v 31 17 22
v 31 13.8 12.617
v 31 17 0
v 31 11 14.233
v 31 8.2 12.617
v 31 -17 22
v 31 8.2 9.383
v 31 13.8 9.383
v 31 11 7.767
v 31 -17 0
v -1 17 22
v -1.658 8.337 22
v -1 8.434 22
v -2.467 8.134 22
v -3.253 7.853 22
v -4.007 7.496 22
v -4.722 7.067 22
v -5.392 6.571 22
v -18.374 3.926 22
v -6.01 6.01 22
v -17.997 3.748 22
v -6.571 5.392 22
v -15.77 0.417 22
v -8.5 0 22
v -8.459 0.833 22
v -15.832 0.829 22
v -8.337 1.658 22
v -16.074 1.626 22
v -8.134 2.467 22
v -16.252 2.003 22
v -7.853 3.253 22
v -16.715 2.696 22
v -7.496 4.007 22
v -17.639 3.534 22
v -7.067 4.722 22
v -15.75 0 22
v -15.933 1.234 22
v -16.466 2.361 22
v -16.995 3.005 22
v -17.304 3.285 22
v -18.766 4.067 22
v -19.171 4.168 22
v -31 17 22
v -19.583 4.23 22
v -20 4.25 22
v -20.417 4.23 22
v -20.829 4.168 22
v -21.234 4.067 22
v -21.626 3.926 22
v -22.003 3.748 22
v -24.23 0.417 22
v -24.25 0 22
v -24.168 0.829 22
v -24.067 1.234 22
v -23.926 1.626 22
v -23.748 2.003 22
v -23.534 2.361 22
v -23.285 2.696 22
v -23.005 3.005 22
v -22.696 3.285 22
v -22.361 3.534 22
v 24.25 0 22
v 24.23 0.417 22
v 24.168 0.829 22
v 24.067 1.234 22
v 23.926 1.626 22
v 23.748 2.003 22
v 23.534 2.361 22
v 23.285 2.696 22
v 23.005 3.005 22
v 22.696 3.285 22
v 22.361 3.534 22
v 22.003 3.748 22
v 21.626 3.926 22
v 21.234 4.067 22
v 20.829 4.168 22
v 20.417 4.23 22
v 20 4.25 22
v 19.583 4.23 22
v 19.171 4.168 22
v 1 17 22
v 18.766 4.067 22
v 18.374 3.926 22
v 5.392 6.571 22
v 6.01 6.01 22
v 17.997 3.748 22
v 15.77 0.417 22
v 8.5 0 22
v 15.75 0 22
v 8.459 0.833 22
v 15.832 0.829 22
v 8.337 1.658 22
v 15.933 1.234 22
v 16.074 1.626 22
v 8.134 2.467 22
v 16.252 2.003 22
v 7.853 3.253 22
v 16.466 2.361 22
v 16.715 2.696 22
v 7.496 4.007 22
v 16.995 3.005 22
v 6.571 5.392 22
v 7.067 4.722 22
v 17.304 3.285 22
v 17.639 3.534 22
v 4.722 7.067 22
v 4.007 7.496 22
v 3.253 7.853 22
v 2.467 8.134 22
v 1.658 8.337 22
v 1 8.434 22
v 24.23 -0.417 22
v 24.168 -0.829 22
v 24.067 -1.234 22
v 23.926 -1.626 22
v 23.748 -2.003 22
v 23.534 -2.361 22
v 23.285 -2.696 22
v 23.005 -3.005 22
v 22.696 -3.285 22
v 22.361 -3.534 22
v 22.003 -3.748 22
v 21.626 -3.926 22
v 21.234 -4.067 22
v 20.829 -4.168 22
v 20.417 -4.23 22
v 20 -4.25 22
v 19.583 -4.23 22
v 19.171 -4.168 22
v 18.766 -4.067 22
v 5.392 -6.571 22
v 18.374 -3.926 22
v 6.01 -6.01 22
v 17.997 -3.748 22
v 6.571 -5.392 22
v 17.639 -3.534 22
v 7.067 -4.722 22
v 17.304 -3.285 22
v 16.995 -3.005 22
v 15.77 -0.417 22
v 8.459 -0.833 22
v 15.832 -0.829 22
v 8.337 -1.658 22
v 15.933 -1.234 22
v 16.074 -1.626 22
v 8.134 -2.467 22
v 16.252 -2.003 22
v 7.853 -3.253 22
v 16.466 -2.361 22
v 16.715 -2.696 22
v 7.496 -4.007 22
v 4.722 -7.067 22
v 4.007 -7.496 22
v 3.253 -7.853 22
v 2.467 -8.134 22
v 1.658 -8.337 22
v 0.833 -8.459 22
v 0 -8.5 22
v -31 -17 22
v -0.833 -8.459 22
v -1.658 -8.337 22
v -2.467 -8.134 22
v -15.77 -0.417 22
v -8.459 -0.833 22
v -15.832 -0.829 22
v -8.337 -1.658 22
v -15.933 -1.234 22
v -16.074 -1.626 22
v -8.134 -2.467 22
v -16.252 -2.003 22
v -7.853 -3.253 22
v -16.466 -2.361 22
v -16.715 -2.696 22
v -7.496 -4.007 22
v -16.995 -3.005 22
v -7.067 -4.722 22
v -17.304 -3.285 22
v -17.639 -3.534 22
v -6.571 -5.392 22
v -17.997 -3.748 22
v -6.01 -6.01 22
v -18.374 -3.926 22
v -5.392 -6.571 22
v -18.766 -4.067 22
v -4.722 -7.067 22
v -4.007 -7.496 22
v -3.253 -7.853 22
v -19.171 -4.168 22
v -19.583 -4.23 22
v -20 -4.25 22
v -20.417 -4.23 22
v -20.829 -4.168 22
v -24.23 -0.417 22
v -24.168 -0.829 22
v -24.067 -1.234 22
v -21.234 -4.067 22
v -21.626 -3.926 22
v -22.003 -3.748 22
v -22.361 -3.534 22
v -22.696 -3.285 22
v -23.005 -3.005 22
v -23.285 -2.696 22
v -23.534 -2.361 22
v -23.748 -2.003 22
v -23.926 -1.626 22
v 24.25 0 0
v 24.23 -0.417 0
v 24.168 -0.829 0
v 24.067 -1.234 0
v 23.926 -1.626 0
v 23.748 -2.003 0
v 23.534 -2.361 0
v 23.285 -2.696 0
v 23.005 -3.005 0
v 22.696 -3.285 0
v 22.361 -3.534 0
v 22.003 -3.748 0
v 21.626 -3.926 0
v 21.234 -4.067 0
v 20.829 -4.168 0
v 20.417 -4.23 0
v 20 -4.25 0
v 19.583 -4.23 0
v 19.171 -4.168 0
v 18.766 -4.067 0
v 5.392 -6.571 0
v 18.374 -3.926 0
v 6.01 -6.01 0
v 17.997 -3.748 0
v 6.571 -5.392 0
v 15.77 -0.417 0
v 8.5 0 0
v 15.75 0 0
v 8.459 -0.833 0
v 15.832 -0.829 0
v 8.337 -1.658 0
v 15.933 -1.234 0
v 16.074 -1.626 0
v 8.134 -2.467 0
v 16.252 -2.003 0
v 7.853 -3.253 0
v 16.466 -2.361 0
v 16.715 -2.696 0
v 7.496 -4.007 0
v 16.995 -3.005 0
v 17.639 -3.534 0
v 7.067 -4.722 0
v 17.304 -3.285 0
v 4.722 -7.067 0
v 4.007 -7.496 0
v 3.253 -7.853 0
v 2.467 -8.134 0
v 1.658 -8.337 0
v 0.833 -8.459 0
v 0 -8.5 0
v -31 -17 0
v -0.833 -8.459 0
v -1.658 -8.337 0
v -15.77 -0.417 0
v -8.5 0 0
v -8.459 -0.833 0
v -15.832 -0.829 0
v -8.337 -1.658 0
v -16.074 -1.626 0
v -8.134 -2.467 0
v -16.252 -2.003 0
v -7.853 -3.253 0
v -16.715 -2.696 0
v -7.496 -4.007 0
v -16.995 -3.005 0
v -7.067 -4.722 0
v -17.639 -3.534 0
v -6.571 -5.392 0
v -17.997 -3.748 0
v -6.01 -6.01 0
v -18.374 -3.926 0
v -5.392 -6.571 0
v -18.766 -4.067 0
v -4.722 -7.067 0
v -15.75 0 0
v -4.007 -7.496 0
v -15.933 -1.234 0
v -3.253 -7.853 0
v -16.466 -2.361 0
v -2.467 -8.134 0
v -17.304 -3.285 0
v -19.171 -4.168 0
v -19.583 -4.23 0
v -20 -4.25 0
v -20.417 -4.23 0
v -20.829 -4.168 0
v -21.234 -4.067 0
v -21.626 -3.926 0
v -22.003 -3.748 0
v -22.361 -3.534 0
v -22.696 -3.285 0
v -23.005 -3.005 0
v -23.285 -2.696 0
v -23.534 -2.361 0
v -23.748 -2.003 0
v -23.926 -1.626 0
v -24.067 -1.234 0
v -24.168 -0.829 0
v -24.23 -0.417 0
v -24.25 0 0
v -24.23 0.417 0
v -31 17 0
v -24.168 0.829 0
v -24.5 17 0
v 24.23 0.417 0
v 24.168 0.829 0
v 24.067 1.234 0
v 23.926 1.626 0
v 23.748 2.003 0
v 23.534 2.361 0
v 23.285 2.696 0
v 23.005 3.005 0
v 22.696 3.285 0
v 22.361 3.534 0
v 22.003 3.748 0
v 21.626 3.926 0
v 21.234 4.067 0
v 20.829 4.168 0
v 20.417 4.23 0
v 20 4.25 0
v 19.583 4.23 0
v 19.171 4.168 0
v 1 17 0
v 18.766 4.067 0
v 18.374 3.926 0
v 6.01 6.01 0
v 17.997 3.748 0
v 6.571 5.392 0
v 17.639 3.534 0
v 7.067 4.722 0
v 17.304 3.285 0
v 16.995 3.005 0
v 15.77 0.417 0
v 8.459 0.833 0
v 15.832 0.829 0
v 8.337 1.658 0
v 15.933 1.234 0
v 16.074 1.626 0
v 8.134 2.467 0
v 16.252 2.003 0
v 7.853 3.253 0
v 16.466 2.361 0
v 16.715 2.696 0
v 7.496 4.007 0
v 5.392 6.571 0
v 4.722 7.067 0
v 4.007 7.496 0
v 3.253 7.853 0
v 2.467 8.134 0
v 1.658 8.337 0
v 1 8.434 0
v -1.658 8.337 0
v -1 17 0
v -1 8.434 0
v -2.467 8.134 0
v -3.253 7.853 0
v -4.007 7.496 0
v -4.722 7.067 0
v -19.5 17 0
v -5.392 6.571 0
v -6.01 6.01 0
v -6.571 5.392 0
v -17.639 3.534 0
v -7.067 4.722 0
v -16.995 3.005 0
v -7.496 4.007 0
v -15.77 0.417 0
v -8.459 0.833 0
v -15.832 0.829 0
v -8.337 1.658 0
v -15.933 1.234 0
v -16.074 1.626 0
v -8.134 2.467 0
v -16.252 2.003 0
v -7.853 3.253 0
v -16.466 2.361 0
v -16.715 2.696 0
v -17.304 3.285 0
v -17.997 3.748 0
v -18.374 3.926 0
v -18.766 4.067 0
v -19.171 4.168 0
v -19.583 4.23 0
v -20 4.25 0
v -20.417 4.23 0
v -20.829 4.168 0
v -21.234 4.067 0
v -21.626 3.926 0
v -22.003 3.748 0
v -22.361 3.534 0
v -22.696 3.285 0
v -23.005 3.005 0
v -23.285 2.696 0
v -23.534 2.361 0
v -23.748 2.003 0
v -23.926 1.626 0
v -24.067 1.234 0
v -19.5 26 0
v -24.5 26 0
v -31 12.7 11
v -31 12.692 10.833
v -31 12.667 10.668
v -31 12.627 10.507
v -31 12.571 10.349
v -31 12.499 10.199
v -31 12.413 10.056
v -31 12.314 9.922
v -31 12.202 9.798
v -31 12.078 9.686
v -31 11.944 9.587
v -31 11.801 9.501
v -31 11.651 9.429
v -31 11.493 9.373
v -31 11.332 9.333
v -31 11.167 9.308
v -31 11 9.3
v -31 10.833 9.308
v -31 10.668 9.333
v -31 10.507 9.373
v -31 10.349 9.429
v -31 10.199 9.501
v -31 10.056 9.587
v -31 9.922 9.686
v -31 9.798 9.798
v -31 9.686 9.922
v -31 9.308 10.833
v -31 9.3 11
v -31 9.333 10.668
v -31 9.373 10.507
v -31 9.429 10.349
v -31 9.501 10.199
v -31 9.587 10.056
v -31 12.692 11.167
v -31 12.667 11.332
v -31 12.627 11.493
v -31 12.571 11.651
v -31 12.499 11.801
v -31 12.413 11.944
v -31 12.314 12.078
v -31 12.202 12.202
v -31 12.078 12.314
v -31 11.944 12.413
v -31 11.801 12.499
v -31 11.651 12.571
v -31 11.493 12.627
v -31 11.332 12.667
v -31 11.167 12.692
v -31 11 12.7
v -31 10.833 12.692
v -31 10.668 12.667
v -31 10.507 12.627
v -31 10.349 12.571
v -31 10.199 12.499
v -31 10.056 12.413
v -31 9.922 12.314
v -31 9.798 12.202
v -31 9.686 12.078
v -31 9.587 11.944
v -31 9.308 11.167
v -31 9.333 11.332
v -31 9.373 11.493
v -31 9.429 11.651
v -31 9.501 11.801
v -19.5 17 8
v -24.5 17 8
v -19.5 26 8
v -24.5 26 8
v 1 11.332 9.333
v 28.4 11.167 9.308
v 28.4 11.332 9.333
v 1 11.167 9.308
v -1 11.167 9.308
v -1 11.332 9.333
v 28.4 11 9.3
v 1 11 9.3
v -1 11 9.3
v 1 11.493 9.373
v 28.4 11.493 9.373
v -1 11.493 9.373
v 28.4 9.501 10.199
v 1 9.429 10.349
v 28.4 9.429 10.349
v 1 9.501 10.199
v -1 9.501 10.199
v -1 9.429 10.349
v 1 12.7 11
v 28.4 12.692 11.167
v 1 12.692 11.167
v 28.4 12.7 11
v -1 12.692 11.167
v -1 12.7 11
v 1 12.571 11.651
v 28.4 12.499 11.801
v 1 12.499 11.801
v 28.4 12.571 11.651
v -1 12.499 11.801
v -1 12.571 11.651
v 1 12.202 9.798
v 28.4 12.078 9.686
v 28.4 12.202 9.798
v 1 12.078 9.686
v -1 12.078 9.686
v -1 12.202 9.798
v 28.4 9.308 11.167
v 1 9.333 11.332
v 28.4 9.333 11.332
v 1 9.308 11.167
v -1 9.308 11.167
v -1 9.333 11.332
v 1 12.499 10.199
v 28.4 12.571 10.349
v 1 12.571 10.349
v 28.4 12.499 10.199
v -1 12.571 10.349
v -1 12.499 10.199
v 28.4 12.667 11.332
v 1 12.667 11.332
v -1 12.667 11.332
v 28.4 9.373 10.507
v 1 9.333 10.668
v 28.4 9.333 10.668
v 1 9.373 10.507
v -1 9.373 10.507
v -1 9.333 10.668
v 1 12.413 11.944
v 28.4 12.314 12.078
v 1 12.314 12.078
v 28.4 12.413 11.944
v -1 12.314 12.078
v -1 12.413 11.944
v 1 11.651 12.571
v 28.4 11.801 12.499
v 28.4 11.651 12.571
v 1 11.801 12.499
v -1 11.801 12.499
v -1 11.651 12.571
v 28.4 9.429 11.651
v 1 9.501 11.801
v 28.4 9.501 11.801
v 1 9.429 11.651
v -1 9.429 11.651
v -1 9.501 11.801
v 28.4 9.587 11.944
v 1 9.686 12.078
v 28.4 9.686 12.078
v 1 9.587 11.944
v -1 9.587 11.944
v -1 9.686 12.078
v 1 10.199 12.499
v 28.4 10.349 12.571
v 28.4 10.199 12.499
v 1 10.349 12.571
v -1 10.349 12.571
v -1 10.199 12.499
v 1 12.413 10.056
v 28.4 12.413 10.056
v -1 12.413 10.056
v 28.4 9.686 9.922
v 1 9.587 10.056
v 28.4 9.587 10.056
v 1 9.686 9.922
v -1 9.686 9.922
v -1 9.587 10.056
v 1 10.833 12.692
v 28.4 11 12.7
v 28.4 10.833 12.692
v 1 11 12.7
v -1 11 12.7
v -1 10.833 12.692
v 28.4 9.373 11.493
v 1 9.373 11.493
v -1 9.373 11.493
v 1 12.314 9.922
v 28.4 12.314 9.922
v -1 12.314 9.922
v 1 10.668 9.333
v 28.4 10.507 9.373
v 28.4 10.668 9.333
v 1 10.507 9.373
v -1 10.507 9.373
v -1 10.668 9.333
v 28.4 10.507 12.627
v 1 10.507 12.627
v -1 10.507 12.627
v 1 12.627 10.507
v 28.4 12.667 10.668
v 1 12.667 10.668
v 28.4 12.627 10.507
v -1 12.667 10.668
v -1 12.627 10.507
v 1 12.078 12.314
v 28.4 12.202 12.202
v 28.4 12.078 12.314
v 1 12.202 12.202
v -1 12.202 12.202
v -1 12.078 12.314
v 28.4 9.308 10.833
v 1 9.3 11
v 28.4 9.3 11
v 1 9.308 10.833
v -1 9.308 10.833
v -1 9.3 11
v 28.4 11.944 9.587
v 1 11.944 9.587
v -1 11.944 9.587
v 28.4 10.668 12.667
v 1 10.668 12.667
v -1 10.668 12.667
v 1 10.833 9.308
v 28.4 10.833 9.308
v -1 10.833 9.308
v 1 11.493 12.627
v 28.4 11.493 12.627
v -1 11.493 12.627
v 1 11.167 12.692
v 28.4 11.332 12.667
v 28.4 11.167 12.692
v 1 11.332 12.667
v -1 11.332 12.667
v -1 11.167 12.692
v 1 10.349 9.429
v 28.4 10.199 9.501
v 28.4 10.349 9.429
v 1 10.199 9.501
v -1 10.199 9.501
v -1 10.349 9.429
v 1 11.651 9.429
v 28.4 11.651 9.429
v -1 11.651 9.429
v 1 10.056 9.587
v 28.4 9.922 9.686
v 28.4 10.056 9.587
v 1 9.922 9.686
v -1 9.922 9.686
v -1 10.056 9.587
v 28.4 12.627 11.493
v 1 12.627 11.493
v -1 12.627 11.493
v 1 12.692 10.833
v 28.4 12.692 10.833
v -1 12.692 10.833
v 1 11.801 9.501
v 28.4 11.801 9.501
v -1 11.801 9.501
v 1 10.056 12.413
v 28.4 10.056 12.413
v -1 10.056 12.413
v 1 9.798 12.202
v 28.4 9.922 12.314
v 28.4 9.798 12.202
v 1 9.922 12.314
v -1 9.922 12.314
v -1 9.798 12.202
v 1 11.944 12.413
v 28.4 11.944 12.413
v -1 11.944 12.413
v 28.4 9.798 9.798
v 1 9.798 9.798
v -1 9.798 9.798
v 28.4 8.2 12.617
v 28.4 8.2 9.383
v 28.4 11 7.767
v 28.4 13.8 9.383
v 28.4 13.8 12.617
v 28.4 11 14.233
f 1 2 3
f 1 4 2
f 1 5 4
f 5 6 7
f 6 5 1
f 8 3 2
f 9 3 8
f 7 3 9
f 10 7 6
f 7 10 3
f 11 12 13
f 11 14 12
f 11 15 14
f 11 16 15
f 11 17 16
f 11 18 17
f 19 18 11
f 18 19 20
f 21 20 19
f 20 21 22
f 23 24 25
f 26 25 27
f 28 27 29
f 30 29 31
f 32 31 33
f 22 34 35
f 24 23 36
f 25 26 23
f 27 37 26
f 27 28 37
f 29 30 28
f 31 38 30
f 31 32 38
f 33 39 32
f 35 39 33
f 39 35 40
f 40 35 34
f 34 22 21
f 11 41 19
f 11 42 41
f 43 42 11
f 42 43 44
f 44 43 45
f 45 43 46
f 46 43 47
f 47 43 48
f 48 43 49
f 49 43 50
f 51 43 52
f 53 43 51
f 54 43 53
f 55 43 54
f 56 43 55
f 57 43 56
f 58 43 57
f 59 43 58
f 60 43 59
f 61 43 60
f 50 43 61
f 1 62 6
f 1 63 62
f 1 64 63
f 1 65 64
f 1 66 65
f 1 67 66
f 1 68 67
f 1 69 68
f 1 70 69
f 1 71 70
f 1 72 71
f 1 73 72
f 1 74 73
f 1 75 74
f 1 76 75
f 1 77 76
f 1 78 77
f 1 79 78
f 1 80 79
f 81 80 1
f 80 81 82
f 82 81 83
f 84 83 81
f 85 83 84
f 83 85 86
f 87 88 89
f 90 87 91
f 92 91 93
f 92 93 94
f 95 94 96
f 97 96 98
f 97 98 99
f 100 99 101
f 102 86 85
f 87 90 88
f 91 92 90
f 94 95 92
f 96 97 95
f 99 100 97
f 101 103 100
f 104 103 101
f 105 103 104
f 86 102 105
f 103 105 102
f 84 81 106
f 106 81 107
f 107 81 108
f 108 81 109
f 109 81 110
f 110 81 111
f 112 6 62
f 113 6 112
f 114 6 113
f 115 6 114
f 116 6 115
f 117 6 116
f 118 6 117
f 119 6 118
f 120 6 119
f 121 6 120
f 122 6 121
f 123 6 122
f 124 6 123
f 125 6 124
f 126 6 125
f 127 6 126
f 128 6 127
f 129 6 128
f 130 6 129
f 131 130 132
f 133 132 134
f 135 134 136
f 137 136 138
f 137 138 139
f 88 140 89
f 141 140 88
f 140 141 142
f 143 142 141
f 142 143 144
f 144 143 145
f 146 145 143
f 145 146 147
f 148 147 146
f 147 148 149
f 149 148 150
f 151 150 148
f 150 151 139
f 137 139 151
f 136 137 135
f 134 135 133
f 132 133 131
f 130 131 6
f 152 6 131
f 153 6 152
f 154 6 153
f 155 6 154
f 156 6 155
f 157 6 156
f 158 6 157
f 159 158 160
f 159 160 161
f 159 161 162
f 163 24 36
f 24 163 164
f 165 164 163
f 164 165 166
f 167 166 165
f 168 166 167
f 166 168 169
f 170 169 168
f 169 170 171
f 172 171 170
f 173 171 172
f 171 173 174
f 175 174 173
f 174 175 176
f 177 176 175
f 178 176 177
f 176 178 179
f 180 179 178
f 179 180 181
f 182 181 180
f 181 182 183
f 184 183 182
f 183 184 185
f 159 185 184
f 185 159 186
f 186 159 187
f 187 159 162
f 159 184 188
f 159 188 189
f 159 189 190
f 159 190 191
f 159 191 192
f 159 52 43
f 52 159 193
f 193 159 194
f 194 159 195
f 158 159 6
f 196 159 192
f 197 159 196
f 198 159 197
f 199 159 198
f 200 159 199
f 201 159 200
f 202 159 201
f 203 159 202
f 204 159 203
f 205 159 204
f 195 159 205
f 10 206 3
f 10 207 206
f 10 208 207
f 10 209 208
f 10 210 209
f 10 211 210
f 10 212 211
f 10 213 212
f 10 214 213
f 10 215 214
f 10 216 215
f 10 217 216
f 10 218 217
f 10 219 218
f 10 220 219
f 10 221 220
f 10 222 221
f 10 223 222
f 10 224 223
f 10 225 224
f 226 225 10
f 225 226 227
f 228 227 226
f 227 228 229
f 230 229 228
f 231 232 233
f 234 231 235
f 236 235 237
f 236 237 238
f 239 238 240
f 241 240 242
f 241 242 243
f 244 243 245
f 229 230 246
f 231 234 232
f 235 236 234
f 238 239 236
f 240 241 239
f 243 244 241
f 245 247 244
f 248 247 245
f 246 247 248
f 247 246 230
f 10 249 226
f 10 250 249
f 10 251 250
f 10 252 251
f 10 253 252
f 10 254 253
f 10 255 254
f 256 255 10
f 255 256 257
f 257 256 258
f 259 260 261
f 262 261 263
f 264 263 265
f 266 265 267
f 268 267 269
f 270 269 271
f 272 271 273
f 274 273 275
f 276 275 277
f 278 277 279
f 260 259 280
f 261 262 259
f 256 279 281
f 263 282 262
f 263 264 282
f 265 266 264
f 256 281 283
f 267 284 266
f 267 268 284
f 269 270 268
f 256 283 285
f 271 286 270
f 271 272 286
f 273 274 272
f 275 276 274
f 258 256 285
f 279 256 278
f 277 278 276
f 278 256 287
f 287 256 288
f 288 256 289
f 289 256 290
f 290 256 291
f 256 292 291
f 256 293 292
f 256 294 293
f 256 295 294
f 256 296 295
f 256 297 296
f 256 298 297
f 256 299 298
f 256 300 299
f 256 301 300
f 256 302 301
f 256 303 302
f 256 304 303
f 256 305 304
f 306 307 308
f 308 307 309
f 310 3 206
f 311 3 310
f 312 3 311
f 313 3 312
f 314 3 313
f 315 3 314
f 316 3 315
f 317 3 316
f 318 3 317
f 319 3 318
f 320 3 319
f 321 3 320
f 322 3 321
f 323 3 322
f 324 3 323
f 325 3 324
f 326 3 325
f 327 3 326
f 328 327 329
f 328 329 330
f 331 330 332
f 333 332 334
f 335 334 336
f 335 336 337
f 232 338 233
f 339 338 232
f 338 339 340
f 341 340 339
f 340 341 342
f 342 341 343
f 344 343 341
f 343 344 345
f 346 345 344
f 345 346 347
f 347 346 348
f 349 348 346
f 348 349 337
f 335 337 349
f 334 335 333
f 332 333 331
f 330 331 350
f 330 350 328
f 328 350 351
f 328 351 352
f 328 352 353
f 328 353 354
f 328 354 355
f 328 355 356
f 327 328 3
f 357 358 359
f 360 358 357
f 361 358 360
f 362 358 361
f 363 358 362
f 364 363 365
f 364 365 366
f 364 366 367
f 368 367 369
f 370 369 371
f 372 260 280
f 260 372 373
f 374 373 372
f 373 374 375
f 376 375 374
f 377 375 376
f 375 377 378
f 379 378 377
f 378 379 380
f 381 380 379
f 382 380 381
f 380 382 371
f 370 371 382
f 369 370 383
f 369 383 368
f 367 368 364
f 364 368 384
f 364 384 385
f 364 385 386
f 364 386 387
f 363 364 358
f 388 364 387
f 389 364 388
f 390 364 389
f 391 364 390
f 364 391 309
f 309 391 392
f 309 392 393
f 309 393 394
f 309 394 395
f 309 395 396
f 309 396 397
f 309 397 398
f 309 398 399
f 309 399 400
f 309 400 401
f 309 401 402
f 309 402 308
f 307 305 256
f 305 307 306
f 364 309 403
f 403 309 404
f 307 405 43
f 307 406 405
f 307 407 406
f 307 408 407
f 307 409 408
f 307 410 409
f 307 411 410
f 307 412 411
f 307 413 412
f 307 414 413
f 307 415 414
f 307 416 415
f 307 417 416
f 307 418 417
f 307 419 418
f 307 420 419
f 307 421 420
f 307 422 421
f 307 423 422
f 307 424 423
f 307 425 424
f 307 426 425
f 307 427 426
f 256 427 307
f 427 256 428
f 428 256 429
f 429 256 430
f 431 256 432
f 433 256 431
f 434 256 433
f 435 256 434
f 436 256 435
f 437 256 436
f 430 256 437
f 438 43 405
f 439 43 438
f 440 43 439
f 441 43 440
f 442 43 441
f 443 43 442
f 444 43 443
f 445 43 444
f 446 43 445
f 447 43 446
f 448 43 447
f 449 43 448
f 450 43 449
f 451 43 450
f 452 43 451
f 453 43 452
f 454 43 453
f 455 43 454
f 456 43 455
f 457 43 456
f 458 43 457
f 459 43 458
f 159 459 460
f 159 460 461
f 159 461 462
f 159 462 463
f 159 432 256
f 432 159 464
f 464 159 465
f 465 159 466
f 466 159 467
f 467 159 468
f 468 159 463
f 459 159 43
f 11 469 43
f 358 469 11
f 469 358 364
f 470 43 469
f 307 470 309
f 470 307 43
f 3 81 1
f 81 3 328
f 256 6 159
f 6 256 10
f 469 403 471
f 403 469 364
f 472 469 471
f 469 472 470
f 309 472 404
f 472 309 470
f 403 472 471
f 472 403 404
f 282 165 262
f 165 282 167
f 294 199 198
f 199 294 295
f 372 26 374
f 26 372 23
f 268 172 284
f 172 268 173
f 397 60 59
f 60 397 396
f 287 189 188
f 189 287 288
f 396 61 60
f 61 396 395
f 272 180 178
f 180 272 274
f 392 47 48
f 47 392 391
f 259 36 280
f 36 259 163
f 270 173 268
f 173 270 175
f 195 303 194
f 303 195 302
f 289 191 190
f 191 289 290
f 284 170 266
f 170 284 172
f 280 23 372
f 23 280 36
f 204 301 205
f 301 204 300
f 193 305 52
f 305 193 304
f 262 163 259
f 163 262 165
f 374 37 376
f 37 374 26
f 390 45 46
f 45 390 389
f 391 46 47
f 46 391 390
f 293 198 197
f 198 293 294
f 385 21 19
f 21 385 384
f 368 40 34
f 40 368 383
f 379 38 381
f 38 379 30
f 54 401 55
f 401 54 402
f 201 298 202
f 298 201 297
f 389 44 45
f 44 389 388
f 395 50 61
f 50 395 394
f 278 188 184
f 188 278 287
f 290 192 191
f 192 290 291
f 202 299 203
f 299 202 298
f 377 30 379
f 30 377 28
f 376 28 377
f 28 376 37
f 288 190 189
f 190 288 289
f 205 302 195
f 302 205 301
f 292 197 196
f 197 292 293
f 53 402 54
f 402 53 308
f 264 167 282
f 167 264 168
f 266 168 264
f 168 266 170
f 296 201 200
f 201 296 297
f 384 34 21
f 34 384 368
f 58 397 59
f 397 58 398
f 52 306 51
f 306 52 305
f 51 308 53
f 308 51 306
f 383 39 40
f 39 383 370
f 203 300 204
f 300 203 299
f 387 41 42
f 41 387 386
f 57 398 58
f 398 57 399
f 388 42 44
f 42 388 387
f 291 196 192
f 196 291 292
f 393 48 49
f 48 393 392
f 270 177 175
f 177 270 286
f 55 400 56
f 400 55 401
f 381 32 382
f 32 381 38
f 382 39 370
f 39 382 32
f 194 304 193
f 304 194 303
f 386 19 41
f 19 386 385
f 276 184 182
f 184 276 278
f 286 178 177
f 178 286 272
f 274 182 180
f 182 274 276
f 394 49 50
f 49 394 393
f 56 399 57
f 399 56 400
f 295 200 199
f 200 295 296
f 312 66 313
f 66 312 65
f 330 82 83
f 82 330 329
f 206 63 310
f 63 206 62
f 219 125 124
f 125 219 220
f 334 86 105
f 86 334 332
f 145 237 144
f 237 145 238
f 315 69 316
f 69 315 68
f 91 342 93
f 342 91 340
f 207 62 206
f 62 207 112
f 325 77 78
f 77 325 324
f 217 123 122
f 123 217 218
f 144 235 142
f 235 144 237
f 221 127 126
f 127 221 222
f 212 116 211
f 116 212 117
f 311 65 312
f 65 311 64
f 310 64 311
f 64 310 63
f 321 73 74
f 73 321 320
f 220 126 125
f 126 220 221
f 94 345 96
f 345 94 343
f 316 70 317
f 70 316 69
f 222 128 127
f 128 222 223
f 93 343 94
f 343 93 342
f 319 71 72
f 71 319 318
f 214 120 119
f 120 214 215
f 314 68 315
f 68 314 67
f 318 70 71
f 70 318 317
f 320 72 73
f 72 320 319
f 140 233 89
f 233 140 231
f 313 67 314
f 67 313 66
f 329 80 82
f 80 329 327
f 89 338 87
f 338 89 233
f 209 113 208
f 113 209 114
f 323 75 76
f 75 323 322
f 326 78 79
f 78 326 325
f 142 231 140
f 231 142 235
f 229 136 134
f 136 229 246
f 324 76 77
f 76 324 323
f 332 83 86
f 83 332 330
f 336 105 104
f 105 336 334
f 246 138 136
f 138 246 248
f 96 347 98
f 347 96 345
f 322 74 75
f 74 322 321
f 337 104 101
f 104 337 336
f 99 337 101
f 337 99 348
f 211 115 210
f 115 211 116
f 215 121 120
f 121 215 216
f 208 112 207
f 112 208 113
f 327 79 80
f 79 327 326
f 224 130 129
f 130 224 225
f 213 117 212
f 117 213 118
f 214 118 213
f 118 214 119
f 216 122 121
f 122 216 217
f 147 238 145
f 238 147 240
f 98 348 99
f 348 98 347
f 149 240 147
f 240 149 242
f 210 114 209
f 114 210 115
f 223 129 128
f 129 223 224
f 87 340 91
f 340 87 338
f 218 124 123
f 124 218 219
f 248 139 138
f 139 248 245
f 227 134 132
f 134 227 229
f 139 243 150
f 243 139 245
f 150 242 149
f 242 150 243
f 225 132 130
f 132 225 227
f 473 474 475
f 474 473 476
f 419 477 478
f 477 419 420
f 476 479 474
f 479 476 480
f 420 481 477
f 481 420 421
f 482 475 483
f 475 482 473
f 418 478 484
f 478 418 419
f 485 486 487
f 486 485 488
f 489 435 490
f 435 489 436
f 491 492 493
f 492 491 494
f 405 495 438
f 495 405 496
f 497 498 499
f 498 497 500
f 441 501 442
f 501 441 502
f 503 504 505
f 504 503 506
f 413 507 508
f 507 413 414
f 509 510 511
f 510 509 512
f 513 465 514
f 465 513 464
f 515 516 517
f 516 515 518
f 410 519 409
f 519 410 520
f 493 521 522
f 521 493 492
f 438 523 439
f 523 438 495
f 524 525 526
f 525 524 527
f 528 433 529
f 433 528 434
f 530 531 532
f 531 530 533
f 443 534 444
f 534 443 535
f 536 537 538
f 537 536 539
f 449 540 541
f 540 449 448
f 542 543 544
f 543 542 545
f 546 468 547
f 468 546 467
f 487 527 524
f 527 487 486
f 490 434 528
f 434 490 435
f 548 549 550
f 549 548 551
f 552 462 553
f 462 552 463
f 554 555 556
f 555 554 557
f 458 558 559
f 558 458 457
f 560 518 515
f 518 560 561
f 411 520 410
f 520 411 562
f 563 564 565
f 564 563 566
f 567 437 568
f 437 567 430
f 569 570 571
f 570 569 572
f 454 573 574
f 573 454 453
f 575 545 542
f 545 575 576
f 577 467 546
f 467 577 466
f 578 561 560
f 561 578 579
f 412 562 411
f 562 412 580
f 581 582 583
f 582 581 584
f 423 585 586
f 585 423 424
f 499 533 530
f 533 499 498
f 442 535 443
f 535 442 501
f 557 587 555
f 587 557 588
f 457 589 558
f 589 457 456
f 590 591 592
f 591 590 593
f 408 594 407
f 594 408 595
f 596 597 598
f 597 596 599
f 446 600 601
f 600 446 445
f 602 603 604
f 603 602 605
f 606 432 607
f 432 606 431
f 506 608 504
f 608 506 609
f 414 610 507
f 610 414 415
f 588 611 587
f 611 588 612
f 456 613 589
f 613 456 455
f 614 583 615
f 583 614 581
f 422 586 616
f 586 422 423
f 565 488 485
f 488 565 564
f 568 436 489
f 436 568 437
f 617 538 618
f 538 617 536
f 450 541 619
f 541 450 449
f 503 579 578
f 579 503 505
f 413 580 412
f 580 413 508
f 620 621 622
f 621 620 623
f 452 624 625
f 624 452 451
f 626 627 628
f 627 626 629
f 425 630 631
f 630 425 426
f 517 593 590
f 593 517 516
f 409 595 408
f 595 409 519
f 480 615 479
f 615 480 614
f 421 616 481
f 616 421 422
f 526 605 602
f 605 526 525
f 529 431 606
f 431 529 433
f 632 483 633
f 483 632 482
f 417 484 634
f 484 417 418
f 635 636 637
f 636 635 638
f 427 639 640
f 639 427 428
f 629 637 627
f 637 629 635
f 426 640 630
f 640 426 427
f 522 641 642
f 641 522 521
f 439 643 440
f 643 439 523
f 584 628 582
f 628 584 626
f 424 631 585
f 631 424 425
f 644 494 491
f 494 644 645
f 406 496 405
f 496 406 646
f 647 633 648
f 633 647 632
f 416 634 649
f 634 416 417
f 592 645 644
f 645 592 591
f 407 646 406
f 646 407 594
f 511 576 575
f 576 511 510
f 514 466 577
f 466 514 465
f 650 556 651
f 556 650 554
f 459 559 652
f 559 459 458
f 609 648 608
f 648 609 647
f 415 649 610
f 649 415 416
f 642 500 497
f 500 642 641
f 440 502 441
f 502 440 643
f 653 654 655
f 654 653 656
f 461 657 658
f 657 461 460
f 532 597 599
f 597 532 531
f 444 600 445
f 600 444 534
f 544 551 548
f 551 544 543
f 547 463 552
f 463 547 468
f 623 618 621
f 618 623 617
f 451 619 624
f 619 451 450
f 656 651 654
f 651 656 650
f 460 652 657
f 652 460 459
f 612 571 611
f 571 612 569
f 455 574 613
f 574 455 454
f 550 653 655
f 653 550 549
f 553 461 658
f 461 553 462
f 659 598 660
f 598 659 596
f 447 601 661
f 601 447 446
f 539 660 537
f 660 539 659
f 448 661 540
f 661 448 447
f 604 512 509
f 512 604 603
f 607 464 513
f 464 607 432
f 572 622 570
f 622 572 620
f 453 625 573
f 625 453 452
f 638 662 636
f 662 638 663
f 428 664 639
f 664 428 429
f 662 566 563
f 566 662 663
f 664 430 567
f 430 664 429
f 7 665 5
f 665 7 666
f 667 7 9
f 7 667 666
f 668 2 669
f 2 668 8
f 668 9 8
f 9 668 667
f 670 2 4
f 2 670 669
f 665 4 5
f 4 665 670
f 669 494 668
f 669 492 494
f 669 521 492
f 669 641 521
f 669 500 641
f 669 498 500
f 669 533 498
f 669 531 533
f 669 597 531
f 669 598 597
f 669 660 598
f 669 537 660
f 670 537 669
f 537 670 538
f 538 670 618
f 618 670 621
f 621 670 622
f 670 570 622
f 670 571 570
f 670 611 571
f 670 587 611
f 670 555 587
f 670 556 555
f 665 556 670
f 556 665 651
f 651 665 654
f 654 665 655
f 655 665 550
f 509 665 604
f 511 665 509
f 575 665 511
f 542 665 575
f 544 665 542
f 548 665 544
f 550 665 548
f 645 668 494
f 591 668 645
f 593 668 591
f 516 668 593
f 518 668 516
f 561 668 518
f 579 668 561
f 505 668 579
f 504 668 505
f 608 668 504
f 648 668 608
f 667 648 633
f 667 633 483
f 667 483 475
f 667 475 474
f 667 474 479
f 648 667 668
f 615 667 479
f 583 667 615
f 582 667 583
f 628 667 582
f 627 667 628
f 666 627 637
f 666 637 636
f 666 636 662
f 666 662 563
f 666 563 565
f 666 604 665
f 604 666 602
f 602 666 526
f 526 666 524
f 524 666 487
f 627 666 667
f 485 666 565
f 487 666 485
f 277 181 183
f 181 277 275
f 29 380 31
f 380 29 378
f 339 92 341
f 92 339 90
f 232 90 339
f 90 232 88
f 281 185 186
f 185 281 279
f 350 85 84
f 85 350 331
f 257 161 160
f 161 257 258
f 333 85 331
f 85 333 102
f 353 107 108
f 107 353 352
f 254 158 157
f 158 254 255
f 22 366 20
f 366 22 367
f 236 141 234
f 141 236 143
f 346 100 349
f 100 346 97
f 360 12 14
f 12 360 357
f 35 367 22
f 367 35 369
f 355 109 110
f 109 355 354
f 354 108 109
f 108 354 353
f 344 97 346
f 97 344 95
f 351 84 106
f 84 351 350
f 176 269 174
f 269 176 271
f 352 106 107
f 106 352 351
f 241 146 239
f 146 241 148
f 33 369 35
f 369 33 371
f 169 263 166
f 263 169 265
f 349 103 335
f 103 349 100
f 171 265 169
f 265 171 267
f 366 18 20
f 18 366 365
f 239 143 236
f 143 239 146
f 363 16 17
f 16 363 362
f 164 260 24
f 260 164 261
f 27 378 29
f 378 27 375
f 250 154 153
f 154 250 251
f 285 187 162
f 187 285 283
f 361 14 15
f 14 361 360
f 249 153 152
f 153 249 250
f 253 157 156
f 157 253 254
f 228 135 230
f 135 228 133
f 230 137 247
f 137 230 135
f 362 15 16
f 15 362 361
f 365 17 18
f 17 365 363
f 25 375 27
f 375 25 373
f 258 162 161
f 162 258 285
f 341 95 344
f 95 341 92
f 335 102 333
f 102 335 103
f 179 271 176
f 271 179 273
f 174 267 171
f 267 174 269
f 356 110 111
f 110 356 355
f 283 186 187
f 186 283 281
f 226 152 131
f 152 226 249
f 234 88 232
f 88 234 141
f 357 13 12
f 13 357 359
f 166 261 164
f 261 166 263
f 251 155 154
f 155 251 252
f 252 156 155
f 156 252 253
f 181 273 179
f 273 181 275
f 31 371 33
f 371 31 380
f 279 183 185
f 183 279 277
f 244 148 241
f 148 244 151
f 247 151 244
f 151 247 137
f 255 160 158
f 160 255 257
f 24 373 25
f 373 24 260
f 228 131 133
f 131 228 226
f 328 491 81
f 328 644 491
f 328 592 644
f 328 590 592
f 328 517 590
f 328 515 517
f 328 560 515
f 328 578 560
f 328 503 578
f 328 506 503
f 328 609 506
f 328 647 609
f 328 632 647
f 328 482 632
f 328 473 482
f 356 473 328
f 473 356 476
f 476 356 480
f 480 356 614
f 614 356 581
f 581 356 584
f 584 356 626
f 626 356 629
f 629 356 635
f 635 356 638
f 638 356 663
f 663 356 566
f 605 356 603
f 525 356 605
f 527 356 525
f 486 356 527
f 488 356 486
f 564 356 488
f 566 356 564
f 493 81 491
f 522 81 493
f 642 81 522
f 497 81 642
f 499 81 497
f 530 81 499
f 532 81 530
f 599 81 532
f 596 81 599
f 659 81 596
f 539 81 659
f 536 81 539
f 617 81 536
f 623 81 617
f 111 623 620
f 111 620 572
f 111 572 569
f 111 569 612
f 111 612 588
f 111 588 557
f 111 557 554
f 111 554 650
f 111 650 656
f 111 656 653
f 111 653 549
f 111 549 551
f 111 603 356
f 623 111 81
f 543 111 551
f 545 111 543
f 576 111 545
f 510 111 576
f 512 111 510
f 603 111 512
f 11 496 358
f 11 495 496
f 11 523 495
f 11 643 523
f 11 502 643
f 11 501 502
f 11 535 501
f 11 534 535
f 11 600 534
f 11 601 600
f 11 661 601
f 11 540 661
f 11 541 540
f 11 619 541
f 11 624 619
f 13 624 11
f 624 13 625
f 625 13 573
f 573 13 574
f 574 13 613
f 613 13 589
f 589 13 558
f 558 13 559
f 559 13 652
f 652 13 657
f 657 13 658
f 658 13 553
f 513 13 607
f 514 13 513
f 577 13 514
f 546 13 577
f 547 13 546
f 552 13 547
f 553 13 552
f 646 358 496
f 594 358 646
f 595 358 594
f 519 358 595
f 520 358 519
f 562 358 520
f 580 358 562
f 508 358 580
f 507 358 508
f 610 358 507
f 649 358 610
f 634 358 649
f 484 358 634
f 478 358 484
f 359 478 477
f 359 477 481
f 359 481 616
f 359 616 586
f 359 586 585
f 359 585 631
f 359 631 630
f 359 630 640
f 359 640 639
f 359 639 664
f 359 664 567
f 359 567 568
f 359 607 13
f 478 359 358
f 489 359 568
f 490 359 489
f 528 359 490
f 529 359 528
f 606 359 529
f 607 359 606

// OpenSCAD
// file: params.scad
// ArtBot - shared parameters for all printed parts. Units: mm.
// Anything tagged VERIFY must be measured against the parts actually ordered
// before you burn filament on a full set.

$fn = 64;
eps = 0.01;

/* ---------- fasteners (clearance holes, not tapped) ---------- */
m2_clear   = 2.4;
m3_clear   = 3.4;
m3_nut_af  = 5.6;   // across flats
m3_nut_t   = 2.6;
m5_clear   = 5.4;
m5_head_d  = 9.6;
m5_head_h  = 5.2;

/* ---------- V-slot extrusion ---------- */
vslot      = 20;    // 2020 face width
vslot_2040 = 40;    // 2040 long face

/* ---------- gantry plate bolt grid ----------
   OpenBuilds Mini-V / Xtreme plates all use a 20 mm M5 grid.
   VERIFY the actual hole positions on the plate you buy - vendors differ
   on WHICH grid holes are present, not on the pitch.                      */
plate_grid = 20;

/* ---------- GT2 belt ---------- */
belt_w      = 6;
belt_pitch  = 2;
belt_back   = 0.80;  // thickness behind the teeth
belt_tooth  = 0.75;  // tooth depth

/* ---------- pen shuttle guide rods ---------- */
rod_d       = 8;
rod_press   = 7.85;  // interference fit in the fixed walls (tune per printer)
rod_slide   = 8.5;   // running clearance in the moving shuttle
rod_spacing = 40;    // centre-to-centre, horizontal
rod_len     = 74;    // cut length. base plate + span + front wall

/* ---------- whiteboard marker ---------- */
pen_d       = 17;    // VERIFY: calliper the barrel of the marker you'll use
pen_clear_d = 24;    // pass-through in the front wall

/* ---------- SG90 servo ----------
   Mount holes are SLOTTED in servo_bracket_sg90.scad on purpose: SG90 clones
   vary by ~1 mm and the throw needs fore/aft trimming at assembly anyway.   */
sg90_len     = 23.0;
sg90_wid     = 12.4;
sg90_hgt     = 22.6;
sg90_tab_span = 32.2;  // screw centre to screw centre
sg90_tab_t    = 2.6;
sg90_screw_d  = 2.4;

/* ---------- limit switch (V-153 / KW12 style lever microswitch) ---------- */
sw_hole_pitch = 9.5;  // VERIFY against your switch
sw_hole_d     = 2.6;
// main file
// ArtBot - pen shuttle. Qty 1.
// Slides on the two guide rods. Clamps the marker. Two compression springs
// (one per rod) push it toward the board; the servo cam pushes it back.
include <params.scad>

sh_w   = 62;   // X
sh_h   = 34;   // Y
sh_d   = 22;   // Z, bearing length on the rods
slit_w = 2.0;  // split-clamp kerf

tab_h  = 26;   // servo cam tab, rises above the body
tab_t  = 5;

module body() {
    translate([-sh_w/2, -sh_h/2, 0]) cube([sh_w, sh_h, sh_d]);
}

module cam_tab() {
    // flat face on the -Z side: the servo horn sweeps against this and
    // pushes the shuttle away from the board. Push-only, spring returns it.
    translate([-tab_t/2 - 22, -sh_h/2, 0]) cube([tab_t, sh_h/2 + tab_h, tab_t + 3]);
}

difference() {
    union() { body(); cam_tab(); }

    // running bores on the rods
    for (x = [-rod_spacing/2, rod_spacing/2])
        translate([x, 0, -eps]) cylinder(d = rod_slide, h = sh_d + 2*eps);

    // marker bore
    translate([0, 0, -eps]) cylinder(d = pen_d, h = sh_d + 2*eps);

    // clamp kerf: from the top face down into the marker bore
    translate([-slit_w/2, 0, -eps]) cube([slit_w, sh_h/2 + eps, sh_d + 2*eps]);

    // pinch bolt across the kerf: M3 clear one side, nut trap the other
    translate([0, sh_h/2 - 6, sh_d/2]) rotate([0, 90, 0]) {
        translate([0, 0, -sh_w/2 - eps]) cylinder(d = m3_clear, h = sh_w + 2*eps);
        translate([0, 0, sh_w/2 - m3_nut_t]) cylinder(d = m3_nut_af / cos(30), h = m3_nut_t + eps, $fn = 6);
    }
}

// PRINT: on its back (the +Z face down) so the rod bores print as vertical
// circles - they come out round and need no support. 4 perimeters, 40% infill.
// If the bores are tight, scale rod_slide up 0.1 mm at a time; do NOT ream by
// hand, you will oval them and the shuttle will bind.
